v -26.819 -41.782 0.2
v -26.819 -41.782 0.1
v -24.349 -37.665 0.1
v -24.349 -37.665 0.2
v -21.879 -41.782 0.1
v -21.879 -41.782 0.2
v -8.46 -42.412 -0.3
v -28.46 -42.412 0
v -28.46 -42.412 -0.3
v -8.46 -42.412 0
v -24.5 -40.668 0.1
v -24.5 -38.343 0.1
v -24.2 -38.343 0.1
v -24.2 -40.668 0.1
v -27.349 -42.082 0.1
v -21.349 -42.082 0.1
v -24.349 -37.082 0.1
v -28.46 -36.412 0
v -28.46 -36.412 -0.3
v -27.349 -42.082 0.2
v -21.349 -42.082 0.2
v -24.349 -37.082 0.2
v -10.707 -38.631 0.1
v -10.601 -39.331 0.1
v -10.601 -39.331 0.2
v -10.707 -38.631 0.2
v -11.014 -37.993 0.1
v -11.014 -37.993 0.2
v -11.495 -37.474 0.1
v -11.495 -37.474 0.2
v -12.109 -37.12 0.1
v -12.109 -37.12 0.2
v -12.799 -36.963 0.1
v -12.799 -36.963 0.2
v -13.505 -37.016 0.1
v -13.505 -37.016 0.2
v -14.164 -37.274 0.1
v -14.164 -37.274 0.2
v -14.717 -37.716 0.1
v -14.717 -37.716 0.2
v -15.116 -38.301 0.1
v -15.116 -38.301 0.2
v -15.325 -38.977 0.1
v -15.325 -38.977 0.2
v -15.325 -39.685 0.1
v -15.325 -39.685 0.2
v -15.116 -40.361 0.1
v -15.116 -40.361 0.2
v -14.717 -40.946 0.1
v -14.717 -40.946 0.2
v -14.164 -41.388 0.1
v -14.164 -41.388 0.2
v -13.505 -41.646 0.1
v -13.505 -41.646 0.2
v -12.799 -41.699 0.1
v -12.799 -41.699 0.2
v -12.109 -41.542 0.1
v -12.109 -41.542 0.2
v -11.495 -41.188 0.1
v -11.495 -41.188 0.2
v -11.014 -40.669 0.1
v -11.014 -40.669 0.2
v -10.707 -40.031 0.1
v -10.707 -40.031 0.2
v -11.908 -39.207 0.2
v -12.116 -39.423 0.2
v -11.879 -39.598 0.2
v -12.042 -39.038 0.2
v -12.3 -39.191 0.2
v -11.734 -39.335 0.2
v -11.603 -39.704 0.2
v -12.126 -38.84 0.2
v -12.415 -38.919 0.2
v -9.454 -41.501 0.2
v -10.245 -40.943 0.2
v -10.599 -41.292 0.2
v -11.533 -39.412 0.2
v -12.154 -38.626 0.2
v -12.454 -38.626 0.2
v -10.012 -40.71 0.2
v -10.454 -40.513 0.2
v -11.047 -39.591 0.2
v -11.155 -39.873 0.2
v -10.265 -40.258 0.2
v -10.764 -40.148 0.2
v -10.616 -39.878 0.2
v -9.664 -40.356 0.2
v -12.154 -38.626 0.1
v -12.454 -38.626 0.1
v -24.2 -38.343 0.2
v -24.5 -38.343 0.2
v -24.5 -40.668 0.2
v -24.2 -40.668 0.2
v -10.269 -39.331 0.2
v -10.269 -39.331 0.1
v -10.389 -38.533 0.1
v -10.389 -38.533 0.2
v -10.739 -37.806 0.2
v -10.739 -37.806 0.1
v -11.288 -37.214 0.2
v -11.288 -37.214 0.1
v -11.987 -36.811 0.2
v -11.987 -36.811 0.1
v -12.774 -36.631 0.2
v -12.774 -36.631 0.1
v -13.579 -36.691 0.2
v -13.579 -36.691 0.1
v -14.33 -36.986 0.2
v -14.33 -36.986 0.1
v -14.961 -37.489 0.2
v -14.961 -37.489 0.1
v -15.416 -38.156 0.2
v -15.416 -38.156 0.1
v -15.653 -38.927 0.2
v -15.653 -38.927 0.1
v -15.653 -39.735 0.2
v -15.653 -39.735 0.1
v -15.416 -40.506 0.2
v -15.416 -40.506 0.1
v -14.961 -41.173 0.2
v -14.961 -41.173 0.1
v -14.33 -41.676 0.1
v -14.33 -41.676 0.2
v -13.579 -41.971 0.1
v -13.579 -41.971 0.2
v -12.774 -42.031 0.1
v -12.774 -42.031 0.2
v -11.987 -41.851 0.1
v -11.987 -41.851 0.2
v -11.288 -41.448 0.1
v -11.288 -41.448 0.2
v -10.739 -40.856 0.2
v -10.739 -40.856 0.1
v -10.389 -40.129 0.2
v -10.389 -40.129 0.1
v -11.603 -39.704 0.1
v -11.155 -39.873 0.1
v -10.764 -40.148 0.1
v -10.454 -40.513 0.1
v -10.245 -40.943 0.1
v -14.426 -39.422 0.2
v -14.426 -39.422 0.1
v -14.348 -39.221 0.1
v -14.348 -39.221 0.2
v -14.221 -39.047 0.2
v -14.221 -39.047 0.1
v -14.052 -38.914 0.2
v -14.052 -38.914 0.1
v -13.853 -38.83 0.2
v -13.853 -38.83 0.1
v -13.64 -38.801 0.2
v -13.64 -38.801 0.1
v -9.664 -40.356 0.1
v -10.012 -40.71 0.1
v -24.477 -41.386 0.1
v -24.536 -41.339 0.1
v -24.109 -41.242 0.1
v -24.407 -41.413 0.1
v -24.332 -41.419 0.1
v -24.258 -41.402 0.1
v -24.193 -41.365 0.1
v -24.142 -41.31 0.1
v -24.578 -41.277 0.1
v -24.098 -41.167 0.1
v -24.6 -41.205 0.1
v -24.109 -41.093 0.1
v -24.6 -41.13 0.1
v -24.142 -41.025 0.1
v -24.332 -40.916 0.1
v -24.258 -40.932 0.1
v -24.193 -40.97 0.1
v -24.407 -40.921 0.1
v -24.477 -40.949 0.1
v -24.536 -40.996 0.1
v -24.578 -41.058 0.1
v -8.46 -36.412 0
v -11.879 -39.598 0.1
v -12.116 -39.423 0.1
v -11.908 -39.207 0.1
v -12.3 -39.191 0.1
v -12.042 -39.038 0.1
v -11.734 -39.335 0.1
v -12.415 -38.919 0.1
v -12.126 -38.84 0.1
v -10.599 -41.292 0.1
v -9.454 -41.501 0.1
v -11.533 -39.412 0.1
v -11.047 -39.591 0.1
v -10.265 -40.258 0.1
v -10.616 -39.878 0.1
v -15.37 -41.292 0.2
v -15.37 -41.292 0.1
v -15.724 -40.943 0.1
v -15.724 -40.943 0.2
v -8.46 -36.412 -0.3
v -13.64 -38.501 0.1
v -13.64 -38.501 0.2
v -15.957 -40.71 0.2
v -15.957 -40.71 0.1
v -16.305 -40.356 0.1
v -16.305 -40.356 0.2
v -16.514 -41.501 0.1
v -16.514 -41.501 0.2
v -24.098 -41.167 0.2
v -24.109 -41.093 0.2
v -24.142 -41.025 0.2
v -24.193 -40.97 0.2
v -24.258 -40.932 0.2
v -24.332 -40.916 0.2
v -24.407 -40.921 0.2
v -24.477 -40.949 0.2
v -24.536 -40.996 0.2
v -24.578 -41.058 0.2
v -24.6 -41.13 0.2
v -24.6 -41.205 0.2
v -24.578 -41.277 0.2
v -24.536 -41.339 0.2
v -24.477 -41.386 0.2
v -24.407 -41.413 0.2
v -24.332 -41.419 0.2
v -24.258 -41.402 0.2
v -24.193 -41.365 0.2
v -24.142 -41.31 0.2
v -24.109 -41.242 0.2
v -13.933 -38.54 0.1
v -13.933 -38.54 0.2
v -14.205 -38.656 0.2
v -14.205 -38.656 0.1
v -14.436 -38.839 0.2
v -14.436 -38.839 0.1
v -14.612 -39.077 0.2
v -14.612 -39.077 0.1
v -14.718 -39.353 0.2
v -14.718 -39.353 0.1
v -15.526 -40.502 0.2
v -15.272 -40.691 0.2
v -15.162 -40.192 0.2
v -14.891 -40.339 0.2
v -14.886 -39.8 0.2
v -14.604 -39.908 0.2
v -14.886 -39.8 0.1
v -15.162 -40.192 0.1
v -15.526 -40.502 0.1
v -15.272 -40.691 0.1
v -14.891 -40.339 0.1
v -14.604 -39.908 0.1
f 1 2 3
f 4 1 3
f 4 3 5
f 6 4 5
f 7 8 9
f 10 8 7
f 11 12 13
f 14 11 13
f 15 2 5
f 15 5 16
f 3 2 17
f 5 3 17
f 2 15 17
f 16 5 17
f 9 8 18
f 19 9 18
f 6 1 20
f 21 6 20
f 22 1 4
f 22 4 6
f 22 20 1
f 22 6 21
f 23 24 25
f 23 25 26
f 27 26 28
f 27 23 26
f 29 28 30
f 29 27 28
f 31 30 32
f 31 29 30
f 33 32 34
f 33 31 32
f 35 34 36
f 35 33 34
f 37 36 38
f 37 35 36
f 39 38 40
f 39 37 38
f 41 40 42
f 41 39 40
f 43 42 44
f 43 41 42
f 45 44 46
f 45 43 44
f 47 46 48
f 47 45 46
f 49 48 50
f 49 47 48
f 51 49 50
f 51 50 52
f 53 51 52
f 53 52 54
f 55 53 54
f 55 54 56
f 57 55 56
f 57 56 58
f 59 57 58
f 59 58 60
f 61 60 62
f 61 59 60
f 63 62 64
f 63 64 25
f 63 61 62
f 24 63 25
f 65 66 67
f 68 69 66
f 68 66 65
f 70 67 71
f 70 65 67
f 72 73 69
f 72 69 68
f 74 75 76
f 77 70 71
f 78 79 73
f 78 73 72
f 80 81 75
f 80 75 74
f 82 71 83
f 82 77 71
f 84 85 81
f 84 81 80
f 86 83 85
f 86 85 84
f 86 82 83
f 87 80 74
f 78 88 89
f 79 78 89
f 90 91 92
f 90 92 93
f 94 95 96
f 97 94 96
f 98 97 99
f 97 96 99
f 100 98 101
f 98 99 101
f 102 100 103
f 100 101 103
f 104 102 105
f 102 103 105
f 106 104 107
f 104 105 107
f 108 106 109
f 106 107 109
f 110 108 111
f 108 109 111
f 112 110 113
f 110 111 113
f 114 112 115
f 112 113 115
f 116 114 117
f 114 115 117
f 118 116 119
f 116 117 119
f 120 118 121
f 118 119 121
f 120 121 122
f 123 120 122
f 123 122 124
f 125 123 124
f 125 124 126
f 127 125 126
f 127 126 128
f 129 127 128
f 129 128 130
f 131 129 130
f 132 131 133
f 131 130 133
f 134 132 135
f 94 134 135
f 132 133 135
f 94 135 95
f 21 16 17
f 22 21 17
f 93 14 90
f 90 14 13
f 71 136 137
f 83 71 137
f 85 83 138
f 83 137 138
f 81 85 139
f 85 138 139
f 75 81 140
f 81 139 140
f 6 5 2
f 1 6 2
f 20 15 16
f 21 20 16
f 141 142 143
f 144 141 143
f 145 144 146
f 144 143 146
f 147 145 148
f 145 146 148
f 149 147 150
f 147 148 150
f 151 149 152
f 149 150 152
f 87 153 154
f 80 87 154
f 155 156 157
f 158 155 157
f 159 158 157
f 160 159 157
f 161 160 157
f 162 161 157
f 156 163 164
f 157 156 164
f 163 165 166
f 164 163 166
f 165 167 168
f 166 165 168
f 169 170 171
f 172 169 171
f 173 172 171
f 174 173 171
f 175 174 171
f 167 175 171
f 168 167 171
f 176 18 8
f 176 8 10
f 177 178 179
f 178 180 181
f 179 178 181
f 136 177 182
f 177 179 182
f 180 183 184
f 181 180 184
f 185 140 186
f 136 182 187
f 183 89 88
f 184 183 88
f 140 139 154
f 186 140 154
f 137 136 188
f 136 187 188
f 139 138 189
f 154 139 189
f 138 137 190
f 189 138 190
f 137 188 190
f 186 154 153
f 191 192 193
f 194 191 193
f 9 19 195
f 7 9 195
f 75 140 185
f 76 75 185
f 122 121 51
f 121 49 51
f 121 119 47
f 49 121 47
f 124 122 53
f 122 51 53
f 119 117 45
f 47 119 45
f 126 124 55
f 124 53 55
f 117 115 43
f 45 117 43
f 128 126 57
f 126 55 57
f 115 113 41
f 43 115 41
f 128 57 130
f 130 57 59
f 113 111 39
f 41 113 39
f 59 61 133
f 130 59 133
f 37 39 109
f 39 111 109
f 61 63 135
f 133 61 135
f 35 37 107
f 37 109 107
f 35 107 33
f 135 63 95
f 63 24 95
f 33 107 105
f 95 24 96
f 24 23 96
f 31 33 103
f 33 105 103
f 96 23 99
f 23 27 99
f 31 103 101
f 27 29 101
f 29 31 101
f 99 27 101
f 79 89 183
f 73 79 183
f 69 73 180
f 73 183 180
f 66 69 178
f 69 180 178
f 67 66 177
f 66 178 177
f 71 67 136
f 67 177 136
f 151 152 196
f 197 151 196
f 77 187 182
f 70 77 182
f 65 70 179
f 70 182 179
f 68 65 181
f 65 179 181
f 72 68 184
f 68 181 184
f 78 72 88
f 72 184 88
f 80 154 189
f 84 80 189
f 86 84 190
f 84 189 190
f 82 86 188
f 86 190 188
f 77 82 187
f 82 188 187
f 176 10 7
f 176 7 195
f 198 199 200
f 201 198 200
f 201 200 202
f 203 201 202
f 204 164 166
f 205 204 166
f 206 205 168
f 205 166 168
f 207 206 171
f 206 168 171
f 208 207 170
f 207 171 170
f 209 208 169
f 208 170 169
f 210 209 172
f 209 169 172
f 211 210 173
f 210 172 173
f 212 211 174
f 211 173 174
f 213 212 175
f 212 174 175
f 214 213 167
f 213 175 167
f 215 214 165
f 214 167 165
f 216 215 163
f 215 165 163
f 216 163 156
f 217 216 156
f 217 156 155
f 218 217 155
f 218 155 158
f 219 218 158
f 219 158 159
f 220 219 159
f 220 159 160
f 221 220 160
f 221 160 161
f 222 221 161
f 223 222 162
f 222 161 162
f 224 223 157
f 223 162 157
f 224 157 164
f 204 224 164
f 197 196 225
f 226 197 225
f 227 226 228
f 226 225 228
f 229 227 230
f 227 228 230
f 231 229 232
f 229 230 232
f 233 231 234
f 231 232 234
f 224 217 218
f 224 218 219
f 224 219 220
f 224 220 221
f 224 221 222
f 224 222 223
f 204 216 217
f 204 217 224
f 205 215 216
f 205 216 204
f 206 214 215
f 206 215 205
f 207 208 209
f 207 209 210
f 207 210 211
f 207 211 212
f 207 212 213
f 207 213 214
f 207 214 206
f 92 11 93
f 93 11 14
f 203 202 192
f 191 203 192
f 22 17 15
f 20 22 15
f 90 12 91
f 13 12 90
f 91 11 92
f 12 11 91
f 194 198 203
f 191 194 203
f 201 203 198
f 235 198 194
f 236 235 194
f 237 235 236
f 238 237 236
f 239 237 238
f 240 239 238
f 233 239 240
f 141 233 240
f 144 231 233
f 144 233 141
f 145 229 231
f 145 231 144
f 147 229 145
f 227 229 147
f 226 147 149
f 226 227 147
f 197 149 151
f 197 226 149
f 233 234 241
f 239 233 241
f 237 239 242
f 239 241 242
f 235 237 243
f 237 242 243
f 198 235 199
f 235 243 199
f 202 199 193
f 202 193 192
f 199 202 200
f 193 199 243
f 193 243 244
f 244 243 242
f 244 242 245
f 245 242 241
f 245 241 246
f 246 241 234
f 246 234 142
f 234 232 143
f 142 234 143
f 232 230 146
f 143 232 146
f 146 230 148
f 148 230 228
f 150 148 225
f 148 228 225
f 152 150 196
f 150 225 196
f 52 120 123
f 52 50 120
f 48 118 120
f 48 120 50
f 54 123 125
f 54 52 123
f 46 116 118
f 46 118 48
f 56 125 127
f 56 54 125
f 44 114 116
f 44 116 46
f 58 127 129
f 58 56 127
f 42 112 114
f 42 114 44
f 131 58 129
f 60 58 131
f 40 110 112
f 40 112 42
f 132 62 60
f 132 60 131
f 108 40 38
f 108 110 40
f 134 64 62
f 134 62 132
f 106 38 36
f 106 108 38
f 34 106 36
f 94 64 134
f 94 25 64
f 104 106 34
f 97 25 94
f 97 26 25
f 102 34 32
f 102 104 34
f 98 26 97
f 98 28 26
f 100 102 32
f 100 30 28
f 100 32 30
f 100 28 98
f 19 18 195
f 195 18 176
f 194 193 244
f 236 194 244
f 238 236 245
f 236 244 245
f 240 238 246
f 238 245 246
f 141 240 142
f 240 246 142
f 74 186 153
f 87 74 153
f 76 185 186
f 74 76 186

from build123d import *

# Parameters (mm, degrees)
ESQUISSE1_W        = 20
ESQUISSE1_H        = 6
EXTRUSION1_DEPTH   = 0.3
EXTRUSION2_DEPTH   = 0.1
ESQUISSE4_R        = 0.252442903
EXTRUSION3_DEPTH   = 0.1
ESQUISSE4_W        = 0.3
ESQUISSE4_H        = 2.324561381
EXTRUSION3_2_DEPTH = 0.1
ESQUISSE5_R        = 2.7075
ESQUISSE5_R_2      = 2.375
EXTRUSION4_DEPTH   = 0.1
EXTRUSION5_DEPTH   = 0.1
EXTRUSION5_2_DEPTH = 0.1


with BuildPart() as part:
    # Esquisse1 → Extrusion1 (new body)
    with BuildSketch(Plane.XY):
        with Locations((-18.459714286, -39.411857143)):
            Rectangle(ESQUISSE1_W, ESQUISSE1_H)
    extrude(amount=-EXTRUSION1_DEPTH)


with BuildPart() as body_2:
    # Esquisse2 → Extrusion2 (new body)
    with BuildSketch(Plane.XY.offset(0.1)):
        Polygon((-27.34919593, -42.082334703), (-21.34919593, -42.082334703), (-24.34919593, -37.082334703), align=None)
        Polygon((-26.819338817, -41.782334703), (-24.34919593, -37.665429892), (-21.879053044, -41.782334703), align=None, mode=Mode.SUBTRACT)
    extrude(amount=EXTRUSION2_DEPTH)


with BuildPart() as body_3:
    # Esquisse4 → Extrusion3 (new body)
    with BuildSketch(Plane(origin=(-58.09753781, -20.9340219, 0.1), x_dir=(1, 0, 0), z_dir=(0, 0, 1))):
        with Locations((33.747043239, -20.233333315)):
            Circle(ESQUISSE4_R)
    extrude(amount=EXTRUSION3_DEPTH)


with BuildPart() as body_4:
    # Esquisse4 → Extrusion3 2 (new body)
    with BuildSketch(Plane(origin=(-58.09753781, -20.9340219, 0.1), x_dir=(1, 0, 0), z_dir=(0, 0, 1))):
        with Locations((33.747043239, -18.571684889)):
            Rectangle(ESQUISSE4_W, ESQUISSE4_H)
    extrude(amount=EXTRUSION3_2_DEPTH)


with BuildPart() as body_5:
    # Esquisse5 → Extrusion4 (new body)
    with BuildSketch(Plane.XY.offset(0.1)):
        with Locations((-12.976239495, -39.330980348)):
            Circle(ESQUISSE5_R)
        with Locations((-12.976239495, -39.330980348)):
            Circle(ESQUISSE5_R_2, mode=Mode.SUBTRACT)
    extrude(amount=EXTRUSION4_DEPTH)


with BuildPart() as body_6:
    # Esquisse6 → Extrusion5 (new body)
    with BuildSketch(Plane.XY.offset(0.1)):
        with BuildLine():
            Line((-10.24489494, -40.943362369), (-10.599117065, -41.291516686))
            Line((-10.599117065, -41.291516686), (-9.454486879, -41.500809256))
            Line((-9.454486879, -41.500809256), (-9.66377945, -40.356179071))
            Line((-9.66377945, -40.356179071), (-10.011933766, -40.710401195))
            ThreePointArc((-10.011933766, -40.710401195), (-10.616239233, -39.878027502), (-11.533384635, -39.412328702))
            ThreePointArc((-11.533384635, -39.412328702), (-11.980400501, -39.127246423), (-12.154388885, -38.626423967))
            Line((-12.154388885, -38.626423967), (-12.454388885, -38.626423967))
            ThreePointArc((-12.454388885, -38.626423967), (-12.215784735, -39.313241752), (-11.60275622, -39.704197822))
            ThreePointArc((-11.60275622, -39.704197822), (-10.763515026, -40.148113761), (-10.24489494, -40.943362369))
        make_face()
    extrude(amount=EXTRUSION5_DEPTH)


with BuildPart() as body_7:
    # Esquisse6 → Extrusion5 2 (new body)
    with BuildSketch(Plane.XY.offset(0.1)):
        with BuildLine():
            Line((-15.956829451, -40.710401195), (-16.304983767, -40.356179071))
            Line((-16.304983767, -40.356179071), (-16.514276338, -41.500809256))
            Line((-16.514276338, -41.500809256), (-15.369646152, -41.291516686))
            Line((-15.369646152, -41.291516686), (-15.723868277, -40.943362369))
            ThreePointArc((-15.723868277, -40.943362369), (-14.891494584, -40.339056902), (-14.425795784, -39.4219115))
            ThreePointArc((-14.425795784, -39.4219115), (-14.140713505, -38.974895634), (-13.639891048, -38.800907251))
            Line((-13.639891048, -38.800907251), (-13.639891048, -38.500907251))
            ThreePointArc((-13.639891048, -38.500907251), (-14.326708834, -38.7395114), (-14.717664904, -39.352539915))
            ThreePointArc((-14.717664904, -39.352539915), (-15.161580843, -40.191781109), (-15.956829451, -40.710401195))
        make_face()
    extrude(amount=EXTRUSION5_2_DEPTH)


solid = Compound([part.part, body_2.part, body_3.part, body_4.part, body_5.part, body_6.part, body_7.part])
